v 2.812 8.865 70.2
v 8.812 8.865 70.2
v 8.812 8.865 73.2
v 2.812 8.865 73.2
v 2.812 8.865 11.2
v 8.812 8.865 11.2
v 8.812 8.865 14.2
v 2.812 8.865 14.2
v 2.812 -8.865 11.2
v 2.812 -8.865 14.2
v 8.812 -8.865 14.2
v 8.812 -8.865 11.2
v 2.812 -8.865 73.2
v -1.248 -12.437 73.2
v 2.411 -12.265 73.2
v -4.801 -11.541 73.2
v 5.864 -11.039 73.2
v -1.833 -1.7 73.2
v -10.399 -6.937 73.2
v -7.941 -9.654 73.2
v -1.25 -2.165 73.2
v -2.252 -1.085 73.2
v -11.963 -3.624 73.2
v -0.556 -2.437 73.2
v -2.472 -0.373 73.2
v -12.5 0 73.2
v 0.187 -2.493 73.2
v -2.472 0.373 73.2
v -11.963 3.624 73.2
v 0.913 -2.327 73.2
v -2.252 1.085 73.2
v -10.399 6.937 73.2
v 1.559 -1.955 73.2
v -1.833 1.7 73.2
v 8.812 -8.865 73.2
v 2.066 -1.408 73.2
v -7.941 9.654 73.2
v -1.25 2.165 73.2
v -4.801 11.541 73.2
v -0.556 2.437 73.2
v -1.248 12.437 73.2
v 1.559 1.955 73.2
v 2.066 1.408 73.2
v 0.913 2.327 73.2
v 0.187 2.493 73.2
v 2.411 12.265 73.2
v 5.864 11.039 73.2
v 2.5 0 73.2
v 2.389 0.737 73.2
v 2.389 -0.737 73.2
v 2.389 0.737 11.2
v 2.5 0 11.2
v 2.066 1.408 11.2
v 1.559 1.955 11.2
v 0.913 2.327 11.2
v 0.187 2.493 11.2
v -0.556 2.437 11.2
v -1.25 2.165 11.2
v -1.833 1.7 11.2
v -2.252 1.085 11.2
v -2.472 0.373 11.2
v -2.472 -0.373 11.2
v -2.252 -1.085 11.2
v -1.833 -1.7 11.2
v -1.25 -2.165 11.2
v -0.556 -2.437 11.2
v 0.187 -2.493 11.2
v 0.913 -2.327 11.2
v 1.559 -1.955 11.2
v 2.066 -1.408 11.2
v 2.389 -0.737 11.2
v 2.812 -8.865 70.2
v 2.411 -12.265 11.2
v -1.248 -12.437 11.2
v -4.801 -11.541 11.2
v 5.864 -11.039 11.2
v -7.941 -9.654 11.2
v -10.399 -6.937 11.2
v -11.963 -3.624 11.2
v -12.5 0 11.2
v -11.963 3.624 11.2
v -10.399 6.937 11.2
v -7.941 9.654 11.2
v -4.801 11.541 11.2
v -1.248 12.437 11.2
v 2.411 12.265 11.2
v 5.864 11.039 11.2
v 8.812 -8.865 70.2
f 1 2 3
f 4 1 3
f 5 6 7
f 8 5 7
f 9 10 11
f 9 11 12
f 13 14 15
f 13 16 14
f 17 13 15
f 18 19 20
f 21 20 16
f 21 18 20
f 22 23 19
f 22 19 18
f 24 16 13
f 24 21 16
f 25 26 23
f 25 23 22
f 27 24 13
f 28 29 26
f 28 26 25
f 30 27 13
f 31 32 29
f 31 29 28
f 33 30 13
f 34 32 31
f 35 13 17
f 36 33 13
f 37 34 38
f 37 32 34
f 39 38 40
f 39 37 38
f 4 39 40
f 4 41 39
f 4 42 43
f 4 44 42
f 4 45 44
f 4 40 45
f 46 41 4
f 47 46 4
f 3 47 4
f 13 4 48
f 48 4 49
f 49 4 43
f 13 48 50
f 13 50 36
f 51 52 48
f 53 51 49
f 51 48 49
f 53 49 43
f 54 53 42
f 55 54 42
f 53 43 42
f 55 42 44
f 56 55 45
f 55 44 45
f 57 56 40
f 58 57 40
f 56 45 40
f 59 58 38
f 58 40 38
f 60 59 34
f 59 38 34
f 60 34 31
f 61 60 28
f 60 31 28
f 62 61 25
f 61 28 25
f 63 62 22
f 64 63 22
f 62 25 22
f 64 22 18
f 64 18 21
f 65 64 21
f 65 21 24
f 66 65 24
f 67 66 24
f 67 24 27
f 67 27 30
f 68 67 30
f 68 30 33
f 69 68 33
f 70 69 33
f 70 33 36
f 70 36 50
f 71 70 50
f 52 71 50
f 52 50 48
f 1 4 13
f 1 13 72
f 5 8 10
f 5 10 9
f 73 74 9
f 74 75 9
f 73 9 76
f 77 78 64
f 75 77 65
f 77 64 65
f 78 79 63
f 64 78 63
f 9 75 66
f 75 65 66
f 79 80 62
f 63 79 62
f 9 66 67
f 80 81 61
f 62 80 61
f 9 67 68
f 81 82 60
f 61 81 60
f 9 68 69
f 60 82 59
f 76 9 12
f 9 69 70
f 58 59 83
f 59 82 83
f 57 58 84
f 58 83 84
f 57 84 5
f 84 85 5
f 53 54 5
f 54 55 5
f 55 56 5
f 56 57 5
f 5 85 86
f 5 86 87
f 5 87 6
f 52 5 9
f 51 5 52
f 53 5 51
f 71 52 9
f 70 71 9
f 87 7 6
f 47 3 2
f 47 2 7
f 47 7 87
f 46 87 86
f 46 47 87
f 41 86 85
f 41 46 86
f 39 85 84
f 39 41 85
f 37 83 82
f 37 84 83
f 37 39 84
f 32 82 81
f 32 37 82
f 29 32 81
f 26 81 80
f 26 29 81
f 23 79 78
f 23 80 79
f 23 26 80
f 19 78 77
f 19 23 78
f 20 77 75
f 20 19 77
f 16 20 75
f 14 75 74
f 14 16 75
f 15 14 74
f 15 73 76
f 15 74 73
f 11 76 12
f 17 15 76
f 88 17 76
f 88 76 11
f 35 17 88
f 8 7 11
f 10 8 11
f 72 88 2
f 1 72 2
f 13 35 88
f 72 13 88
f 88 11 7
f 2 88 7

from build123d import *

# Parameters (mm, degrees)
SKETCH_1_R               = 2.5
EXTRUDE_1_DEPTH          = 88.2
SKETCH_2_R               = 12.5
EXTRUDE_2_DEPTH          = 62
SKETCH_3_W               = 40
SKETCH_3_H               = 17.730441408
SKETCH_3_R               = 5
EXTRUDE_3_DEPTH          = 3
PATTERN_LINEAR_1_COUNT   = 2
PATTERN_LINEAR_1_PITCH   = 59
CUT_EXTRUDE_1_DEPTH      = 85.347436238
CUT_EXTRUDE_1_DEPTH_BACK = 85.347436238
SKETCH_6_W               = 31.187630179
SKETCH_6_H               = 17.730441408
CUT_EXTRUDE_7_DEPTH      = 6
PATTERN_LINEAR_3_COUNT   = 2
PATTERN_LINEAR_3_PITCH   = 59
CUT_EXTRUDE_8_DEPTH      = 92.595344354
SKETCH_10_W              = 11.2
SKETCH_10_H              = 5
CUT_EXTRUDE_9_DEPTH      = 78.257408107
SKETCH_11_R              = 2.5
CUT_EXTRUDE_10_DEPTH     = 65.470923679


with BuildPart() as part:
    # 草图1 → 凸台-拉伸1 (new body)
    with BuildSketch(Plane.XY):
        Circle(SKETCH_1_R)
    extrude(amount=EXTRUDE_1_DEPTH)

    # 草图2 → 凸台-拉伸2 (add)
    with BuildSketch(Plane.XY.offset(73.2)):
        Circle(SKETCH_2_R)
    extrude(amount=-EXTRUDE_2_DEPTH)

    # 草图3 → 凸台-拉伸3 (add)
    with BuildSketch(Plane.XY.offset(73.2)):
        with Locations((20, 0)):
            Rectangle(SKETCH_3_W, SKETCH_3_H)
        with Locations((32.640039451, 0)):
            Circle(SKETCH_3_R, mode=Mode.SUBTRACT)
    extrude_3 = extrude(amount=-EXTRUDE_3_DEPTH)

    # 阵列(线性)1: 凸台-拉伸3 ×2
    with Locations(*[(0, 0, -i * PATTERN_LINEAR_1_PITCH) for i in range(1, PATTERN_LINEAR_1_COUNT)]):
        add(extrude_3)

    # 草图6 → 切除-拉伸1 (cut, two sides: drawn at the far end of the back side and taken through both)
    with BuildSketch(Plane.XY.offset(73.2).offset(-CUT_EXTRUDE_1_DEPTH_BACK)):
        with Locations((24.406184911, 0)):
            Rectangle(SKETCH_6_W, SKETCH_6_H)
    extrude(amount=CUT_EXTRUDE_1_DEPTH + CUT_EXTRUDE_1_DEPTH_BACK, mode=Mode.SUBTRACT)

    # 草图8 → 切除-拉伸7 (cut)
    with BuildSketch(Plane(origin=(8.812369821, 0, 0), x_dir=(0, 0, -1), z_dir=(1, 0, 0))):
        Polygon((-70.2, 8.865220704), (-72.620989075, 8.865220704), (-73.2, 8.865220704), (-73.2, 6.367777059), (-73.2, -8.865220704), (-70.2, -8.865220704), align=None)
    cut_extrude_7 = extrude(amount=-CUT_EXTRUDE_7_DEPTH, mode=Mode.SUBTRACT)

    # 阵列(线性)3: 切除-拉伸7 ×2
    with Locations(*[(0, 0, -i * PATTERN_LINEAR_3_PITCH) for i in range(1, PATTERN_LINEAR_3_COUNT)]):
        add(cut_extrude_7, mode=Mode.SUBTRACT)

    # 草图9 → 切除-拉伸8 (cut, through all)
    with BuildSketch(Plane(origin=(8.812369821, 0, 0), x_dir=(0, 0, -1), z_dir=(1, 0, 0))):
        Polygon((-73.2, -2.531338833), (-73.2, 2.528560393), (-88.2, 2.5), (-88.2, -2.5), align=None)
    extrude(amount=-CUT_EXTRUDE_8_DEPTH, mode=Mode.SUBTRACT)

    # 草图10 → 切除-拉伸9 (cut, through all)
    with BuildSketch(Plane(origin=(8.812369821, 0, 0), x_dir=(0, 0, -1), z_dir=(1, 0, 0))):
        with Locations((-5.6, 0)):
            Rectangle(SKETCH_10_W, SKETCH_10_H)
    extrude(amount=-CUT_EXTRUDE_9_DEPTH, mode=Mode.SUBTRACT)

    # 草图11 → 切除-拉伸10 (cut, through all)
    with BuildSketch(Plane.XY.offset(73.2)):
        Circle(SKETCH_11_R)
    extrude(amount=-CUT_EXTRUDE_10_DEPTH, mode=Mode.SUBTRACT)


solid = part.part
